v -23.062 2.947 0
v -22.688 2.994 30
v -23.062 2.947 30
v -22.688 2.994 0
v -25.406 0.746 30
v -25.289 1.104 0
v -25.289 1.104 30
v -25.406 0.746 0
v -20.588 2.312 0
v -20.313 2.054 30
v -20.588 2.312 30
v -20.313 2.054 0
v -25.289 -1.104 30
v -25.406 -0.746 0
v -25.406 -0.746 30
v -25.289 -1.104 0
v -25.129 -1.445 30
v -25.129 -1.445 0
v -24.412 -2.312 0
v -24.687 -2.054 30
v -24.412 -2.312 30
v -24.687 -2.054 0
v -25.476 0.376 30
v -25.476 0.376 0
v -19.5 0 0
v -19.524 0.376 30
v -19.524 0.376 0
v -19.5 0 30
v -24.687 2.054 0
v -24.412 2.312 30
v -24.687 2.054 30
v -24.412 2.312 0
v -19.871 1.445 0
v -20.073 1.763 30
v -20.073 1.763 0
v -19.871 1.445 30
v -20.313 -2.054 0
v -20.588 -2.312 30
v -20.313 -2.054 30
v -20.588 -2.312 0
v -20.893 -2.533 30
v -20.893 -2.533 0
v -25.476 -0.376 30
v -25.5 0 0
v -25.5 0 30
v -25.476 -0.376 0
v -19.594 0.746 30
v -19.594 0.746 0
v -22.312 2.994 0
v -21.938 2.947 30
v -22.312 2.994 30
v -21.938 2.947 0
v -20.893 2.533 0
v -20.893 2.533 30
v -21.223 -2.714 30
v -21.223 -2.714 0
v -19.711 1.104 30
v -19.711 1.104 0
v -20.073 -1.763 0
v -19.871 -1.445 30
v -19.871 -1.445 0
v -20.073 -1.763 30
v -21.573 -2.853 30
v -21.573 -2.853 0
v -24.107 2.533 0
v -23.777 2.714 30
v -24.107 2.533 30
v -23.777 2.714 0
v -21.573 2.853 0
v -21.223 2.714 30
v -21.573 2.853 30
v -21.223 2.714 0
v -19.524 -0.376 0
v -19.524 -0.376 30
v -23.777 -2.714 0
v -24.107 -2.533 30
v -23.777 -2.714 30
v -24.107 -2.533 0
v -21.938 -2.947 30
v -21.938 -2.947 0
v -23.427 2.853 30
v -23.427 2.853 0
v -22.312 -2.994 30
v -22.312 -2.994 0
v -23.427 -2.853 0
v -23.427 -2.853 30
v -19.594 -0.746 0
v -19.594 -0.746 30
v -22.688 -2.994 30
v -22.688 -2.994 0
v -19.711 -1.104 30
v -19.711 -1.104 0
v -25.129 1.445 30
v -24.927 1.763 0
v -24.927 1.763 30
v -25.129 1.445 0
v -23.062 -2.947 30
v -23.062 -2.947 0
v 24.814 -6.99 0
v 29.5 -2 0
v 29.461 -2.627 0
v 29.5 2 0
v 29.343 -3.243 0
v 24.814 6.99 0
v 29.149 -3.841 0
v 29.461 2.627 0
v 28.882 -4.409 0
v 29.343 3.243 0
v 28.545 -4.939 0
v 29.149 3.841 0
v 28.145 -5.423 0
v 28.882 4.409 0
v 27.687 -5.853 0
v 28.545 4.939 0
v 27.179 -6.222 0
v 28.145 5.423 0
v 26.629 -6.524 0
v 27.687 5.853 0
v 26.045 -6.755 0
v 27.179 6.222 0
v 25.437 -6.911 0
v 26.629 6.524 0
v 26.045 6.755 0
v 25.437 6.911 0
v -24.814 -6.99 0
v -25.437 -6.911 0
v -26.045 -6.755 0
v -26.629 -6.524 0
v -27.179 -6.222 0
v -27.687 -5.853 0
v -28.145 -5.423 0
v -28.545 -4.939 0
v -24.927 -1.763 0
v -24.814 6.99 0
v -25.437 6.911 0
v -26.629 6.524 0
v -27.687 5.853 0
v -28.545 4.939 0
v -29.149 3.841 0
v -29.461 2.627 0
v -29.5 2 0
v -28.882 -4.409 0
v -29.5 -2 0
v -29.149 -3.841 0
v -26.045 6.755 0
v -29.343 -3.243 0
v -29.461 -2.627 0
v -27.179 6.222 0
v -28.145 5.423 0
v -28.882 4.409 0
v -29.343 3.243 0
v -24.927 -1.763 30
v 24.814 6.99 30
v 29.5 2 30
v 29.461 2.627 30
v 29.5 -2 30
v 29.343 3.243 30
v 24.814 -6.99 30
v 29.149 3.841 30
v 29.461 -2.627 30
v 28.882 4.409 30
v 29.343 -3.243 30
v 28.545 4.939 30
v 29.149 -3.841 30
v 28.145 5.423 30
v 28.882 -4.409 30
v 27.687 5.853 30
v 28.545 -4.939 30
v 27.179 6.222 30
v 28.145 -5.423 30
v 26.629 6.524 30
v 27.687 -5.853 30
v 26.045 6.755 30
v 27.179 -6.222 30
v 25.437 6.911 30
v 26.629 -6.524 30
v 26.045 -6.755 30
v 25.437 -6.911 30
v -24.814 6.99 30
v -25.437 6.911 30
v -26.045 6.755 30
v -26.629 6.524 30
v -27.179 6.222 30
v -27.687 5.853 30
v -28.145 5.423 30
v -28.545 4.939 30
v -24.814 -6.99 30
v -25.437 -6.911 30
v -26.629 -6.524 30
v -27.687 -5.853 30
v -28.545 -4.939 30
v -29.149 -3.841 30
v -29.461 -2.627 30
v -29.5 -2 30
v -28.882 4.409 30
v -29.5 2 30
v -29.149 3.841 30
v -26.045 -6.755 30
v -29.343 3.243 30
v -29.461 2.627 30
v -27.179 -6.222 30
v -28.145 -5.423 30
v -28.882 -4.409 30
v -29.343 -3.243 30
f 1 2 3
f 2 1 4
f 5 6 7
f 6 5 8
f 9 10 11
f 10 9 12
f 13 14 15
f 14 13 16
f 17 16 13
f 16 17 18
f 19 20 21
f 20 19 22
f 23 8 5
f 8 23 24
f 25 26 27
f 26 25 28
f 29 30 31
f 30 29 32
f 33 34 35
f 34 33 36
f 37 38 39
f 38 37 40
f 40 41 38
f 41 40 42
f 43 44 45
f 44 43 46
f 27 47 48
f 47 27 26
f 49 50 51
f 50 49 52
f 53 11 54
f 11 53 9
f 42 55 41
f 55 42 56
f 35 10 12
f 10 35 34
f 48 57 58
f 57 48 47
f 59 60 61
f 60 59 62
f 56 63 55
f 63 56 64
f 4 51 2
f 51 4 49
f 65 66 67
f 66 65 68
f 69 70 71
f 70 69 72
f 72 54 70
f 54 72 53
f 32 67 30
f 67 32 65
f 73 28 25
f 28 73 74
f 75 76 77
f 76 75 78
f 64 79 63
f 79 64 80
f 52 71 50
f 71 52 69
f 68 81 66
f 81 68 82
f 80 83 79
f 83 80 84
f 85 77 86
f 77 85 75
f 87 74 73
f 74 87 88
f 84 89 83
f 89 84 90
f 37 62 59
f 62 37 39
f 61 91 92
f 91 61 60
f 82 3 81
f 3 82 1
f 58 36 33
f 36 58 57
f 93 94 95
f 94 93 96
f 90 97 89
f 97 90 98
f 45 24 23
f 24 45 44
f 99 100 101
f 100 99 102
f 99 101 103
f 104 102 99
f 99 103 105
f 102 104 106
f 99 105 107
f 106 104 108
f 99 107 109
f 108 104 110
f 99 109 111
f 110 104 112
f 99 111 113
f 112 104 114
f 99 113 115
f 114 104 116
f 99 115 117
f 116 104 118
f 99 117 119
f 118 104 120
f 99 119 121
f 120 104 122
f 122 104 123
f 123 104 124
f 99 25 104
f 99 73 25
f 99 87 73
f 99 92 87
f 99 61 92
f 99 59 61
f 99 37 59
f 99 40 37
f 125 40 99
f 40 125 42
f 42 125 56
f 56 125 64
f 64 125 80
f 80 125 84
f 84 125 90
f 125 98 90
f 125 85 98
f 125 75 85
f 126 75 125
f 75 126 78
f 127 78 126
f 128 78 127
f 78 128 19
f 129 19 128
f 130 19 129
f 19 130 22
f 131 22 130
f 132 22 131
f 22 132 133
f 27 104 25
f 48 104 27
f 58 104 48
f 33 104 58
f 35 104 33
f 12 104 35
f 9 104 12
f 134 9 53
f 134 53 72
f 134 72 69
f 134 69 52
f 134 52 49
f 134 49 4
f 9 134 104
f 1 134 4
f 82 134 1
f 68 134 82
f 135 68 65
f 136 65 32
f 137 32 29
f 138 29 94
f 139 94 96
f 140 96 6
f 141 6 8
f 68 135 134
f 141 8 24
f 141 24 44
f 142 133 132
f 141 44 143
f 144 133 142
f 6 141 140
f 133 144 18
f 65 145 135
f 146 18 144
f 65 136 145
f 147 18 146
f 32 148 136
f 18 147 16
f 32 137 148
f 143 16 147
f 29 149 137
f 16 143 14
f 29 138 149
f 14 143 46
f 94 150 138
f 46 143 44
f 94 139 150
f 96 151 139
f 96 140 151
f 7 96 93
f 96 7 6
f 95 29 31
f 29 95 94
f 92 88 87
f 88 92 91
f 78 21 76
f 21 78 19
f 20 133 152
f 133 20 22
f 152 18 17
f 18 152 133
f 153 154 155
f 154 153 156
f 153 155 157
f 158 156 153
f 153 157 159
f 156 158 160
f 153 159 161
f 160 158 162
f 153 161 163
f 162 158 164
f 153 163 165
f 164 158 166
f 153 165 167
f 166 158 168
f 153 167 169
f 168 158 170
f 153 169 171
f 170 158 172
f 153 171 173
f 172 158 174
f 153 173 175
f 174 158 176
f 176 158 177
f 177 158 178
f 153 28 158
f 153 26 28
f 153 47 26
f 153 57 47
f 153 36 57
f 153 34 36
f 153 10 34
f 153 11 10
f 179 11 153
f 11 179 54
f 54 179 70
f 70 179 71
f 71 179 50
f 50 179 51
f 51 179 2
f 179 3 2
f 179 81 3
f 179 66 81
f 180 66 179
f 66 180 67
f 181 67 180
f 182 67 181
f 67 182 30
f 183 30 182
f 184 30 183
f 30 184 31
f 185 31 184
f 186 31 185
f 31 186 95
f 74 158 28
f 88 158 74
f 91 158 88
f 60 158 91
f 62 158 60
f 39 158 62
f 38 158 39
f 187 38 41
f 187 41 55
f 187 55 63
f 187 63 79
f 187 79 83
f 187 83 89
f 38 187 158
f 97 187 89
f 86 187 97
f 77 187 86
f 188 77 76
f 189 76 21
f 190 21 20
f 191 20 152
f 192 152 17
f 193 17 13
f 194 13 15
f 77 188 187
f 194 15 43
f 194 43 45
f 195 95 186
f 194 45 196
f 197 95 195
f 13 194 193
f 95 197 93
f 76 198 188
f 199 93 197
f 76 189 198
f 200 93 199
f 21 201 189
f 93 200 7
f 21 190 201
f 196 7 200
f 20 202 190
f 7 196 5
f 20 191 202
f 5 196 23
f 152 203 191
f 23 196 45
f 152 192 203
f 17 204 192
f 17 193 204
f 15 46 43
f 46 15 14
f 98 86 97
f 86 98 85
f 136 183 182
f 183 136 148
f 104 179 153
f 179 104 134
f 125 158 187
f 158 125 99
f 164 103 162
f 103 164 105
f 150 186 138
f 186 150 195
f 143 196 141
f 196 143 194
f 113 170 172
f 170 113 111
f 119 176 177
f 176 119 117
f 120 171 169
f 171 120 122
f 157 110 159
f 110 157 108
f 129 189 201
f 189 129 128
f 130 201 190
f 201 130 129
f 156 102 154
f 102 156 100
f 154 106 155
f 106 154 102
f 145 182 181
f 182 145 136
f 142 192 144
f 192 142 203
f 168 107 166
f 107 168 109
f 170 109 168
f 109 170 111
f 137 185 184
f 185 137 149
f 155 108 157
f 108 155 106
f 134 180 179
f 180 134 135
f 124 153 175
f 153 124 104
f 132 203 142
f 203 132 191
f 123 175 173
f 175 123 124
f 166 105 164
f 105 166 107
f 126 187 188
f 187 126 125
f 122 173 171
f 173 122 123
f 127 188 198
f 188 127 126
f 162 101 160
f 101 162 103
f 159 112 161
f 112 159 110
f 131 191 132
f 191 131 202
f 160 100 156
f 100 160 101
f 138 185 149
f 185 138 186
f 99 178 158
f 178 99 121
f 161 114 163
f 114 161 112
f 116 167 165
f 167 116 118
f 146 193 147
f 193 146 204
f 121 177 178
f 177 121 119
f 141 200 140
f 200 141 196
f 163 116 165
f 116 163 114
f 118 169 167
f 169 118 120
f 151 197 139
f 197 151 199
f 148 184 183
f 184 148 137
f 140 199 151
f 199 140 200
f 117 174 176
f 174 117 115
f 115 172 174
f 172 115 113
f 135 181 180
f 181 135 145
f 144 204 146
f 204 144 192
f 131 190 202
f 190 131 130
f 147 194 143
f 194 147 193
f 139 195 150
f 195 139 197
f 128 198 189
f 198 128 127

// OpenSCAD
$fn = 50;


difference() {
	union() {
		hull() {
			translate(v = [-24.5000000000, 2.0000000000, 0]) {
				cylinder(h = 30, r = 5);
			}
			translate(v = [24.5000000000, 2.0000000000, 0]) {
				cylinder(h = 30, r = 5);
			}
			translate(v = [-24.5000000000, -2.0000000000, 0]) {
				cylinder(h = 30, r = 5);
			}
			translate(v = [24.5000000000, -2.0000000000, 0]) {
				cylinder(h = 30, r = 5);
			}
		}
	}
	union() {
		translate(v = [-22.5000000000, 0.0000000000, 0]) {
			cylinder(h = 30, r = 3.0000000000);
		}
		translate(v = [-22.5000000000, 0.0000000000, 0]) {
			cylinder(h = 30, r = 1.5000000000);
		}
		translate(v = [-22.5000000000, 0.0000000000, 0]) {
			cylinder(h = 30, r = 1.5000000000);
		}
		translate(v = [-22.5000000000, 0.0000000000, 0]) {
			cylinder(h = 30, r = 1.5000000000);
		}
	}
}
